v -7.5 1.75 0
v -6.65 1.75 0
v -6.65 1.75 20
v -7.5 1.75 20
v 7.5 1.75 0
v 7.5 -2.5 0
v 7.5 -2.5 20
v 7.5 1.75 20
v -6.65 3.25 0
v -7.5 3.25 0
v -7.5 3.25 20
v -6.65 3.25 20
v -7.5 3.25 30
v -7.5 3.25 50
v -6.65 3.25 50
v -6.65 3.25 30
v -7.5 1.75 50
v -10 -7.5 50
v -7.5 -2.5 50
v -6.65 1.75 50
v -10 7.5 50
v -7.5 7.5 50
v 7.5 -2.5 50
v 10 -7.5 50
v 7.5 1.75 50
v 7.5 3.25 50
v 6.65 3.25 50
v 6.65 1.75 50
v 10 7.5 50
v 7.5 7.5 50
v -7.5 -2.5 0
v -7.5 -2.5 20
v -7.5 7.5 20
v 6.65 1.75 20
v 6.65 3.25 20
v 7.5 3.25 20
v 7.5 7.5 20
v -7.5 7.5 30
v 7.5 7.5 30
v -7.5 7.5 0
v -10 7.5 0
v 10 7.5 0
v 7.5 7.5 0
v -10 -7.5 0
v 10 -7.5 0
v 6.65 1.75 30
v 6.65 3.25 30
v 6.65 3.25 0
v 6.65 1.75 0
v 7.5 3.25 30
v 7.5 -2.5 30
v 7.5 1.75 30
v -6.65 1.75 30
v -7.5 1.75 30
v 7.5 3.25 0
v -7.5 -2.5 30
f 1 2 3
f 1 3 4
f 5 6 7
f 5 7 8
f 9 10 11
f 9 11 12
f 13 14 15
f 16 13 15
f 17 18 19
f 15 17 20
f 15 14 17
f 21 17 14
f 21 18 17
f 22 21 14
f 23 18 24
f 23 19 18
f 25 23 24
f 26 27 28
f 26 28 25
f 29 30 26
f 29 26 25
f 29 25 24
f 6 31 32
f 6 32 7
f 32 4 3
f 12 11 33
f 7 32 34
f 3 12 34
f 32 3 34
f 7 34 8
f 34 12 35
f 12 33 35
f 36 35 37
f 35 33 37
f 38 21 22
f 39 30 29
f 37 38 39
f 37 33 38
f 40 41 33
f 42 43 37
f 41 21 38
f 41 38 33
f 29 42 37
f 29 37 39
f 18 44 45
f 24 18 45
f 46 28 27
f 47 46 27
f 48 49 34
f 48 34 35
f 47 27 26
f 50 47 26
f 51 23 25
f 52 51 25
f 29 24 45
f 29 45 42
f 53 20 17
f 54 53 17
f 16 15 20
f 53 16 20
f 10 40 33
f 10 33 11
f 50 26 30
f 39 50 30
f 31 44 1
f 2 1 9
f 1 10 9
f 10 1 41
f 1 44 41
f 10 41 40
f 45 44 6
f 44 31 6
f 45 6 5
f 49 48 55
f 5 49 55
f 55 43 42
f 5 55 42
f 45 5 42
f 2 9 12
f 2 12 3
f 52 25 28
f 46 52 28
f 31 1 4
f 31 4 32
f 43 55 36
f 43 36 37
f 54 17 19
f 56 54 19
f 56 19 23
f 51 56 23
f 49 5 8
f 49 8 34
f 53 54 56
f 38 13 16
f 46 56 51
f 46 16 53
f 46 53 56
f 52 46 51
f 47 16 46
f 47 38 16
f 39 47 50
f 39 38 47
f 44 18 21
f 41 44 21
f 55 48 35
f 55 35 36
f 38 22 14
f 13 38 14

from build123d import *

# Parameters (mm, degrees)
SKETCH2_W           = 20
SKETCH2_H           = 15
BOSS_EXTRUDE1_DEPTH = 50
CUT_EXTRUDE2_DEPTH  = 20


with BuildPart() as part:
    # Sketch2 → Boss-Extrude1 (new body)
    with BuildSketch(Plane.XY):
        Rectangle(SKETCH2_W, SKETCH2_H)
    extrude(amount=BOSS_EXTRUDE1_DEPTH)

    # Sketch4 → Cut-Extrude2 (cut)
    with BuildSketch(Plane.XY.offset(50)):
        Polygon((-7.5, -2.5), (7.5, -2.5), (7.5, 1.75), (6.65, 1.75), (6.65, 3.25), (7.5, 3.25), (7.5, 7.5), (-7.5, 7.5), (-7.5, 3.25), (-6.65, 3.25), (-6.65, 1.75), (-7.5, 1.75), align=None)
    cut_extrude2 = extrude(amount=-CUT_EXTRUDE2_DEPTH, mode=Mode.SUBTRACT)

    # Mirror1: Cut-Extrude2 across plane
    add(cut_extrude2.mirror(Plane.XY.offset(25)), mode=Mode.SUBTRACT)


solid = part.part
